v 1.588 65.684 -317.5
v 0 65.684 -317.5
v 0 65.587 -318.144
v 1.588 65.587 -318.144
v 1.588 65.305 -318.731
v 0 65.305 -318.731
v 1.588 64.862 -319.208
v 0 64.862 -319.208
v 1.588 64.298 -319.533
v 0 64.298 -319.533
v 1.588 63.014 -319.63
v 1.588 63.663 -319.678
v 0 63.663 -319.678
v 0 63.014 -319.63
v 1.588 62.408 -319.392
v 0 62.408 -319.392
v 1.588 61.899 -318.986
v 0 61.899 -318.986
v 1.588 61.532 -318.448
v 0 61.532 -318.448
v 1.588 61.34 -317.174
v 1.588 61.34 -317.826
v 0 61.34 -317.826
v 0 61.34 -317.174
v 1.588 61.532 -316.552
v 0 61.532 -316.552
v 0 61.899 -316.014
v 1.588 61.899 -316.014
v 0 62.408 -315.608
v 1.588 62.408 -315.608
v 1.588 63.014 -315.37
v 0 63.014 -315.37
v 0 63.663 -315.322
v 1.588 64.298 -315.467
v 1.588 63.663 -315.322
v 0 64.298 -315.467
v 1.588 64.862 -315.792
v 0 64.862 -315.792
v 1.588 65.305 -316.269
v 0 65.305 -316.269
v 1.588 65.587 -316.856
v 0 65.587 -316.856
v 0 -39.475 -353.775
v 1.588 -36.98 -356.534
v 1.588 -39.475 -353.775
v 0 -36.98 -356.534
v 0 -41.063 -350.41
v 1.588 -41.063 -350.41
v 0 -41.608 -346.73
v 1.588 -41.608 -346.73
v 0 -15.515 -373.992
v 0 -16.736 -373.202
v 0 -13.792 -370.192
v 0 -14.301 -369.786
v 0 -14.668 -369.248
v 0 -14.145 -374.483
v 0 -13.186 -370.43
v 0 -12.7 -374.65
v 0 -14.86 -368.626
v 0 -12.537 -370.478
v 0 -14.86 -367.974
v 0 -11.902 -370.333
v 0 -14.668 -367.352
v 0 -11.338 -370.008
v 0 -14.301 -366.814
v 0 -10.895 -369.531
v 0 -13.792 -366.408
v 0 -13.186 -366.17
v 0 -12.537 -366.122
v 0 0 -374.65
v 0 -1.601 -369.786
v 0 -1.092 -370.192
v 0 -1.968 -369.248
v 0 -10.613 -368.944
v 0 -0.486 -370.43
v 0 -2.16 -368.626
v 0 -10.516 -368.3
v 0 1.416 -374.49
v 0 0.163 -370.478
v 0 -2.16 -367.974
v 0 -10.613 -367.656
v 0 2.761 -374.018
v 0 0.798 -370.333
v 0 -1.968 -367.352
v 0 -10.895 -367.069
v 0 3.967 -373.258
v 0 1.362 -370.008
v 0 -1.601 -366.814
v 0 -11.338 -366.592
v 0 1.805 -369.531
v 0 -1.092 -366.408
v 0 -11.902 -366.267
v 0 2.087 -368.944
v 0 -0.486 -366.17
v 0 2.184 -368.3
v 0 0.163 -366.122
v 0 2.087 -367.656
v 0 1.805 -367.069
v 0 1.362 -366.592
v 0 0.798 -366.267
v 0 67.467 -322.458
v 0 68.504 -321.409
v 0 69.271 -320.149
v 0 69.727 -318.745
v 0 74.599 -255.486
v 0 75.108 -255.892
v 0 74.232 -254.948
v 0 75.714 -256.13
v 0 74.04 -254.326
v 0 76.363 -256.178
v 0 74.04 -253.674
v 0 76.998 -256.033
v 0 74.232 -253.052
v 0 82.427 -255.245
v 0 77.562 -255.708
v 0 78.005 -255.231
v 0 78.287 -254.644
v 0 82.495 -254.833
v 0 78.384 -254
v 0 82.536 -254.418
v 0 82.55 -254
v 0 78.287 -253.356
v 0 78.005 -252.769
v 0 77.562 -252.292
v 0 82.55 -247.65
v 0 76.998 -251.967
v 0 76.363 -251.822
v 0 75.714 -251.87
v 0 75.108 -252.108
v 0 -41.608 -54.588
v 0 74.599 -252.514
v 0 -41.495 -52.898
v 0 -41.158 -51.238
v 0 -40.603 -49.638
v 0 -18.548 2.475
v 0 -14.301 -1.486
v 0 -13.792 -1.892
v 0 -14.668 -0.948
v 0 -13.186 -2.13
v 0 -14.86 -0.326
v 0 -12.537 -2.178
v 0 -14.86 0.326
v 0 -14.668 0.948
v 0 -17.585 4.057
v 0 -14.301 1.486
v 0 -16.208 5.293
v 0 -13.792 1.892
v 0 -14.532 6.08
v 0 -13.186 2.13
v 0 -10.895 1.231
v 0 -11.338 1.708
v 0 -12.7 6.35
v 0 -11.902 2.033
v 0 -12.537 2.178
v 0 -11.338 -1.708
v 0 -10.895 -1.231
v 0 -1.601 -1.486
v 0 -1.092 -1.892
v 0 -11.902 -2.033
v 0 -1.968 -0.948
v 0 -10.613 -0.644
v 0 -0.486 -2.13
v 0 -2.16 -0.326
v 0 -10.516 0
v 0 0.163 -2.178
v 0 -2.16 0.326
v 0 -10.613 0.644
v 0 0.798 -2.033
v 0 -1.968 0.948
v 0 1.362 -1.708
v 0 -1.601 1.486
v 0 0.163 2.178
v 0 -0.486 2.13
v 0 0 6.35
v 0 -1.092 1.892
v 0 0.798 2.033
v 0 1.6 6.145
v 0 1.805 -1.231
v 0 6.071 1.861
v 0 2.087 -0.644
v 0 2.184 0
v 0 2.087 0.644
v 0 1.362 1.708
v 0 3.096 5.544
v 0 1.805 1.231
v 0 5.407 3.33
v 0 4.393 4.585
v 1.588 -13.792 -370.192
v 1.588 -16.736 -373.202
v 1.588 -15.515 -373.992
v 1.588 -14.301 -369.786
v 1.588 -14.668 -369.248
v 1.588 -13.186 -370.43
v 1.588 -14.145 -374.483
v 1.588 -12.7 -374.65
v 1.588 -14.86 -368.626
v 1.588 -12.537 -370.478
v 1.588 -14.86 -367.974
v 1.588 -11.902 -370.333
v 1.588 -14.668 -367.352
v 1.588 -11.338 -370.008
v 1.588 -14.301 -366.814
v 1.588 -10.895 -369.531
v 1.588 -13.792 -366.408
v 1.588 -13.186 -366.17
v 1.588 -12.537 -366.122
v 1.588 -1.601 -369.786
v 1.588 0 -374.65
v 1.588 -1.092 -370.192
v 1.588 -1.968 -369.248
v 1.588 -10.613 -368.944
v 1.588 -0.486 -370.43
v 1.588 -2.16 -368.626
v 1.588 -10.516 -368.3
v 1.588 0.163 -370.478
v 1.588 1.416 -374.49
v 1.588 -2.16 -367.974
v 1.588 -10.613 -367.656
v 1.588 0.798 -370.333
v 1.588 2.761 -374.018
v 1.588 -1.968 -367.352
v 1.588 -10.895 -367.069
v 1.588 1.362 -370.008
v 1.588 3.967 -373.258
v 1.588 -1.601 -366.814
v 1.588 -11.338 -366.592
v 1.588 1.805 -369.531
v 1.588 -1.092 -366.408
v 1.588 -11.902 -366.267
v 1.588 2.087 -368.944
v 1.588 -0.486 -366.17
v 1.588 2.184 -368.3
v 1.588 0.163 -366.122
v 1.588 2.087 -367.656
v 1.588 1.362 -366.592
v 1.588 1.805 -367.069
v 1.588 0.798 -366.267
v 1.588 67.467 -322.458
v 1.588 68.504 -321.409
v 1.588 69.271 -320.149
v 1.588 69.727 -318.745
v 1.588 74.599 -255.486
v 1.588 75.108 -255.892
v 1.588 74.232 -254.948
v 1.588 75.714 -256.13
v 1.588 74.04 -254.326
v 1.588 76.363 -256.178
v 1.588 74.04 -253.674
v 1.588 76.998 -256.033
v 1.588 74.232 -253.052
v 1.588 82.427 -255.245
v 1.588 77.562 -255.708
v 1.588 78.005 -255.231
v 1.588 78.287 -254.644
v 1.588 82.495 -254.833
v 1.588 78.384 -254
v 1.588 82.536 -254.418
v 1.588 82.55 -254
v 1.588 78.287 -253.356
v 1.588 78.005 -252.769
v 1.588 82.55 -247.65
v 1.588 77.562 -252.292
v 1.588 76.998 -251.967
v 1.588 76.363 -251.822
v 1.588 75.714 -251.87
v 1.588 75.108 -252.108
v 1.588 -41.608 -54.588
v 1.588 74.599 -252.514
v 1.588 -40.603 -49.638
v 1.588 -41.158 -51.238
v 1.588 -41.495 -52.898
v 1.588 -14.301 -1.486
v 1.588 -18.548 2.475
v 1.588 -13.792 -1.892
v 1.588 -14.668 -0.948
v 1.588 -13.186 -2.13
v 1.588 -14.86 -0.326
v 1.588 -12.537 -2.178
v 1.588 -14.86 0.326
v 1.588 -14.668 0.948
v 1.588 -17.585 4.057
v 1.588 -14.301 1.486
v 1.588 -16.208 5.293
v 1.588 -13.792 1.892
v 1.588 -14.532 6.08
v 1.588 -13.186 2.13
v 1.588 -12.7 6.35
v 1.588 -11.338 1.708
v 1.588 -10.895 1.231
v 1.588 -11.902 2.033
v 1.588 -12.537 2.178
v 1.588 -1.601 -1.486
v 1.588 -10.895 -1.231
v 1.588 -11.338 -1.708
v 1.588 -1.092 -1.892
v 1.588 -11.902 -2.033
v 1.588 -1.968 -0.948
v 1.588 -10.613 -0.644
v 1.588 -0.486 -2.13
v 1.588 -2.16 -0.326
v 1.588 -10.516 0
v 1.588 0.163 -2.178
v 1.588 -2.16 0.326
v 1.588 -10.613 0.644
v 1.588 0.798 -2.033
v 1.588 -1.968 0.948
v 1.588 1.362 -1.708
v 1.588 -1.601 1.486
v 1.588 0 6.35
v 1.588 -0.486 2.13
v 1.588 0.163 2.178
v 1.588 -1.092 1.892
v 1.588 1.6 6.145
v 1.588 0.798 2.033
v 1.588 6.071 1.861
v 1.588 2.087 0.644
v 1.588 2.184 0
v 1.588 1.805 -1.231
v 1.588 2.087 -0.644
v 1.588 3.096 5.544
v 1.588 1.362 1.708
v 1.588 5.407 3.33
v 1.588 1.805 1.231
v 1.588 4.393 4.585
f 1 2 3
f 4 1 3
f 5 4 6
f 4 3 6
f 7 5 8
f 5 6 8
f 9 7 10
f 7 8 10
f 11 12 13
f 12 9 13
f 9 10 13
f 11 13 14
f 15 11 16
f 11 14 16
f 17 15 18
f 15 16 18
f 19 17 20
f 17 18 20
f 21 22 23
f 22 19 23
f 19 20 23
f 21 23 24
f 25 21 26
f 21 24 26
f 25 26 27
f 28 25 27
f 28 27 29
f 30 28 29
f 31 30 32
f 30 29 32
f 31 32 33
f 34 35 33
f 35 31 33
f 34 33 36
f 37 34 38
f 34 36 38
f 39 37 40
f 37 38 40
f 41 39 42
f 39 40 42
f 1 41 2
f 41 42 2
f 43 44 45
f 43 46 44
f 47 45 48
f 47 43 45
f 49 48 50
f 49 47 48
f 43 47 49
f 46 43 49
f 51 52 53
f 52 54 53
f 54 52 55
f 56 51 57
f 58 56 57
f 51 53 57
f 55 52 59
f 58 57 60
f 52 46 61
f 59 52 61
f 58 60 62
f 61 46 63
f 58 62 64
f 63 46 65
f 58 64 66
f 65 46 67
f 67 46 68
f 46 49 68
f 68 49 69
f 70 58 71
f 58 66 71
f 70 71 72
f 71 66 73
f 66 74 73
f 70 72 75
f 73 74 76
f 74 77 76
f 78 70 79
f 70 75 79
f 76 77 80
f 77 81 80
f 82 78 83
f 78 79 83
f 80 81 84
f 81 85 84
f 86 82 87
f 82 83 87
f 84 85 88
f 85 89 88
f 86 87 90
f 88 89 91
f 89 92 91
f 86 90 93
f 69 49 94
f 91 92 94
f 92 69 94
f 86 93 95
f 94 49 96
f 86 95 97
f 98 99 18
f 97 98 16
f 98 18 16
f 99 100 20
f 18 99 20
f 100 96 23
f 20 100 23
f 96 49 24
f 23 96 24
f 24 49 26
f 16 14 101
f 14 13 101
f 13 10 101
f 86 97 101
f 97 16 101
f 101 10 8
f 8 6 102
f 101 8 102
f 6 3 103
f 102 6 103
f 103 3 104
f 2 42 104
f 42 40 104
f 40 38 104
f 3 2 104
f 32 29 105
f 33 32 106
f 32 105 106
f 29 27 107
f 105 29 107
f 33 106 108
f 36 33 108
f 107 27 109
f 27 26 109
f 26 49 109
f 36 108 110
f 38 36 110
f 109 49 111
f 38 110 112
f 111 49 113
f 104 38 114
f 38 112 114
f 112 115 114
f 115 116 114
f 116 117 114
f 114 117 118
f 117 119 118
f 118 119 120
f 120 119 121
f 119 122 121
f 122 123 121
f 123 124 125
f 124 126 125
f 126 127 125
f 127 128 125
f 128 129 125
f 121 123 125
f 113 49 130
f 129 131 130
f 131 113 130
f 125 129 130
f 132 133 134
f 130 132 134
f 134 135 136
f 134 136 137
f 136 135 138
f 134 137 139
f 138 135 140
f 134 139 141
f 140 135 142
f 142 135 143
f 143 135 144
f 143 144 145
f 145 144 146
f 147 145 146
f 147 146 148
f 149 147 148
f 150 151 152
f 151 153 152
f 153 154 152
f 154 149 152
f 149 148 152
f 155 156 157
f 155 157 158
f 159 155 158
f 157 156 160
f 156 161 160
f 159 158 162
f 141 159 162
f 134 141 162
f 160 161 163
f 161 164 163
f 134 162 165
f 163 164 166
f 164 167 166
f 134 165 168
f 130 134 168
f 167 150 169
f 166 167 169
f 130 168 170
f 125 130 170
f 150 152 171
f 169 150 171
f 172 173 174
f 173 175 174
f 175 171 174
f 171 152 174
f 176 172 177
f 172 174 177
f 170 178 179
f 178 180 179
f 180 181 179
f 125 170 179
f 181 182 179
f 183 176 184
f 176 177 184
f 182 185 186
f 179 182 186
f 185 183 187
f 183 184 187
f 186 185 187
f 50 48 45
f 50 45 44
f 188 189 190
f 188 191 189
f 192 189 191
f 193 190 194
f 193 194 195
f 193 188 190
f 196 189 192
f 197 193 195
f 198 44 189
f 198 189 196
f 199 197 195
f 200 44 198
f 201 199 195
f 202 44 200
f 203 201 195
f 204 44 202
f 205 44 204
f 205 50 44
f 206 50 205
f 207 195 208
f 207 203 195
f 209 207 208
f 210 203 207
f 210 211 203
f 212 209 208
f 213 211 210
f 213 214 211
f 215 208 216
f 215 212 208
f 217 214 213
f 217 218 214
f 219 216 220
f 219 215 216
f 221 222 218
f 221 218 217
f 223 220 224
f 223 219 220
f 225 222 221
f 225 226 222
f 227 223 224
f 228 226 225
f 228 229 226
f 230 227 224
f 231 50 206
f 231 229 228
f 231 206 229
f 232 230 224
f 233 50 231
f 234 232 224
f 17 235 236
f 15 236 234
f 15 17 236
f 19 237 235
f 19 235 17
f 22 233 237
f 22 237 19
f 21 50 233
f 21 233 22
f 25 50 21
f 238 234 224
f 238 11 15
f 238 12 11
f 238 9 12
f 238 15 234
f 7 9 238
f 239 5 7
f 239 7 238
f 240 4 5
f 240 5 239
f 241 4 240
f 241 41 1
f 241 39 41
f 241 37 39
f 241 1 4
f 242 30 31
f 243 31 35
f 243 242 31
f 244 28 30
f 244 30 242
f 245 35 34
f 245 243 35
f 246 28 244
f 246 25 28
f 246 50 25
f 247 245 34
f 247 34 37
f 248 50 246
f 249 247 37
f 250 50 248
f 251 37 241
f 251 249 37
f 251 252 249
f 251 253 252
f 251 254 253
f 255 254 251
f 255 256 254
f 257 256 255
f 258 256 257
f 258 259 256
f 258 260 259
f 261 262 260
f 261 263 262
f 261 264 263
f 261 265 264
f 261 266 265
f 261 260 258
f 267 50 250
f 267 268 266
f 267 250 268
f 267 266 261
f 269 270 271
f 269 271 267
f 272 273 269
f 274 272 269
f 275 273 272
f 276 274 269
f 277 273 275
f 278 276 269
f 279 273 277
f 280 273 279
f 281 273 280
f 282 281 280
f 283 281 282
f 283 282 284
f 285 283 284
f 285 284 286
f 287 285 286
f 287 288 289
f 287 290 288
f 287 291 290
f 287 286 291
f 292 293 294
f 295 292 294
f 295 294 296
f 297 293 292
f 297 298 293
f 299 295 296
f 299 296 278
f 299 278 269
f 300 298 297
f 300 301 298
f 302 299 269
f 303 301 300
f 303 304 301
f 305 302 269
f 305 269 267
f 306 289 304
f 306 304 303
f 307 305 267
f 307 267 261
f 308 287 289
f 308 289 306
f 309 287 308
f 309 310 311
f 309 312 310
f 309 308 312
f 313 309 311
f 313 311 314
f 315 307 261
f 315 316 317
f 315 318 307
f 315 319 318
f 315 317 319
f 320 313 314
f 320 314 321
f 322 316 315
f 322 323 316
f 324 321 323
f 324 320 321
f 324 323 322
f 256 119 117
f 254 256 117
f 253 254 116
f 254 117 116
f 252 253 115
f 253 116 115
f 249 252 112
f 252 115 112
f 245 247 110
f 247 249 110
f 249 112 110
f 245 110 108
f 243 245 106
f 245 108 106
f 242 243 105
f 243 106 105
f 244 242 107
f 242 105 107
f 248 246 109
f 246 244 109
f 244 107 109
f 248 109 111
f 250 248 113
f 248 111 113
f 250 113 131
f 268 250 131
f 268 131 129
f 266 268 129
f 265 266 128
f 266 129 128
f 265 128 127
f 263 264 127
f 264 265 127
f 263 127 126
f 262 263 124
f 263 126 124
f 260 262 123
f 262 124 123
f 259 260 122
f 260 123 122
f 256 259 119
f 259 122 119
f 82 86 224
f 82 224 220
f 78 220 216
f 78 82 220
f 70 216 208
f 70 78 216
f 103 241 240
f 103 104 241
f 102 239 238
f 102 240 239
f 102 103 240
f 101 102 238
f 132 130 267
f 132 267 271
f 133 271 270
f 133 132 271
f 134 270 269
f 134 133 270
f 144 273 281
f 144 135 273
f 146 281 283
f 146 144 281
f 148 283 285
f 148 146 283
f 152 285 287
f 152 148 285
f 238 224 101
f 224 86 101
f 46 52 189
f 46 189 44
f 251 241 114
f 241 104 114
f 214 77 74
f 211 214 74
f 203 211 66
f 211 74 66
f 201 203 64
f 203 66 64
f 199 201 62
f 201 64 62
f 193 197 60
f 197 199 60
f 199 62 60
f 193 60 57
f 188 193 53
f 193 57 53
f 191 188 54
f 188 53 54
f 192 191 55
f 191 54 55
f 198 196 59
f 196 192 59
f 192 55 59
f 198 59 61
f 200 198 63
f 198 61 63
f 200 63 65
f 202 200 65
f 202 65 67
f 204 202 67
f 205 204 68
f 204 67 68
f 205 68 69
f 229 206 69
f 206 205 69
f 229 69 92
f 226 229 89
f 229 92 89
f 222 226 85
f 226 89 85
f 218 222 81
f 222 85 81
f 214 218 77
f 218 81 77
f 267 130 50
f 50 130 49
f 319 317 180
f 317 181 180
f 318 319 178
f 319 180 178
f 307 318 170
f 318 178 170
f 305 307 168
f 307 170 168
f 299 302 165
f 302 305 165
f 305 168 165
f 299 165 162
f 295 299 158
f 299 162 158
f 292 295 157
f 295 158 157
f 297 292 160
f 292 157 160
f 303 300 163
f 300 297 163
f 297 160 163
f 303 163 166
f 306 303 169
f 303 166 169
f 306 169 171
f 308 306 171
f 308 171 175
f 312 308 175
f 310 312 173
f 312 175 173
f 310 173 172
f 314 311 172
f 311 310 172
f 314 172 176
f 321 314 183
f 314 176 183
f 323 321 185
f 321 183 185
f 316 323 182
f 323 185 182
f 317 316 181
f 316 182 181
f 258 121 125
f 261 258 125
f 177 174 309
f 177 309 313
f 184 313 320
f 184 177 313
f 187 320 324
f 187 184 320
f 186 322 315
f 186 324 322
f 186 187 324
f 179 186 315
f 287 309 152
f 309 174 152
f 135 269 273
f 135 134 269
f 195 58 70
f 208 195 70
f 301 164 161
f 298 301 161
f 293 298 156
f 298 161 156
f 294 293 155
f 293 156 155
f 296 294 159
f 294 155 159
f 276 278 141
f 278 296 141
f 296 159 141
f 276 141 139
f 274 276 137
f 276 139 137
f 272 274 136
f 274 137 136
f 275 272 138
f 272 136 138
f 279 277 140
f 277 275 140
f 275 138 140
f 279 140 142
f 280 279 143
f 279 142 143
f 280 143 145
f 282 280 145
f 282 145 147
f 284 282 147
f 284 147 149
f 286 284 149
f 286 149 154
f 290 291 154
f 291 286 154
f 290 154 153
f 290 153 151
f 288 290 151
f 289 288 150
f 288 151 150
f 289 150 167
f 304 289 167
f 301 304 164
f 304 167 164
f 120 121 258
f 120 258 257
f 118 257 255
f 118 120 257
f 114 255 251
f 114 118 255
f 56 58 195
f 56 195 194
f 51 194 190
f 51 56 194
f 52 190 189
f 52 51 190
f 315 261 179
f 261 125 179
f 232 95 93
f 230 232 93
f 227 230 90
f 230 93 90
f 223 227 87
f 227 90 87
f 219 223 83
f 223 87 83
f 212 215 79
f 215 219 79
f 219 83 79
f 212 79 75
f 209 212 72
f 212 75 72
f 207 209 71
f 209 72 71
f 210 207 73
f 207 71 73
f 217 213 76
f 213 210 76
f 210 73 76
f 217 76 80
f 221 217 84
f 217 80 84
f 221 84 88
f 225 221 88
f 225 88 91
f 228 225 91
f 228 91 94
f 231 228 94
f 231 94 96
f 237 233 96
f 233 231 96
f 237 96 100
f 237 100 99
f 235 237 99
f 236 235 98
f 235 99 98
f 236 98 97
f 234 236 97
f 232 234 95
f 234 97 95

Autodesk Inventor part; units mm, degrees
ref_plane "YZ Plane" through (0, 0, 0) normal (1, 0, 0) x (0, 1, 0)
ref_plane "XZ Plane" through (0, 0, 0) normal (0, 1, 0) x (-1, 0, 0)
ref_plane "XY Plane" through (0, 0, 0) normal (0, 0, 1) x (1, 0, 0)
sketch "maiin" plane through (0, 0, 0) normal (0, 0, 1) x (1, 0, 0)
  circle A0 centre (114.3234, 350.4213) radius 2.1844
  circle A1 centre (127.0234, 350.4213) radius 2.1844
  line L0 (86.4201, 300.7833) -> (108.4755, 352.8962)
  arc A2 (86.4201, 300.7833) -> (85.4157, 295.8335) centre (98.1157, 295.8335) ccw
  line L1 (209.5734, 102.7713) -> (133.0946, 352.2822)
  line L2 (209.5734, 96.4213) -> (209.5734, 102.7713)
  circle A3 centre (203.2234, 96.4213) radius 2.1844
  arc A4 (209.45, 95.176) -> (209.5734, 96.4213) centre (203.2234, 96.4213) ccw
  line L3 (196.75, 31.676) -> (209.45, 95.176)
  circle A5 centre (190.5234, 32.9213) radius 2.1844
  line L4 (85.4157, 295.8335) -> (85.4157, 3.6912)
  circle A6 centre (127.0234, -17.8787) radius 2.1844
  circle A7 centre (114.3234, -17.8787) radius 2.1844
  arc A8 (127.0234, -24.2287) -> (130.9902, -22.8372) centre (127.0234, -17.8787) ccw
  arc A9 (110.2871, -22.7809) -> (114.3234, -24.2287) centre (114.3234, -17.8787) ccw
  arc A10 (194.4902, 27.9628) -> (196.75, 31.676) centre (190.5234, 32.9213) ccw
  arc A11 (85.4157, 3.6912) -> (90.0433, -6.1132) centre (98.1157, 3.6912) ccw
  line L5 (130.9902, -22.8372) -> (194.4902, 27.9628)
  line L6 (110.2871, -22.7809) -> (90.0433, -6.1132)
  line L7 (114.3234, -24.2287) -> (127.0234, -24.2287)
  arc A12 (114.3234, 356.7713) -> (108.4755, 352.8962) centre (114.3234, 350.4213) ccw
  line L8 (127.0234, 356.7713) -> (114.3234, 356.7713)
  arc A13 (133.0946, 352.2822) -> (127.0234, 356.7713) centre (127.0234, 350.4213) ccw
  point P0 (137.6055, 139.9011)
  point P1 (110.8157, 355.7146)
  dimension "d0" = 12.7
  dimension "d1" = 12.7
  dimension "d2" = 25.4
sketch "Sketch1" plane through (0, 0, 0) normal (1, 0, 0) x (0, 1, 0)
  circle A0 centre (-12.7, 0) radius 2.1844
  circle A1 centre (0, 0) radius 2.1844
  line L0 (-40.6033, -49.6379) -> (-18.5478, 2.4749)
  arc A2 (-40.6033, -49.6379) -> (-41.6076, -54.5878) centre (-28.9076, -54.5878) ccw
  line L1 (82.55, -247.65) -> (6.0712, 1.8609)
  line L2 (82.55, -254) -> (82.55, -247.65)
  circle A3 centre (76.2, -254) radius 2.1844
  arc A4 (82.4267, -255.2453) -> (82.55, -254) centre (76.2, -254) ccw
  line L3 (69.7267, -318.7453) -> (82.4267, -255.2453)
  circle A5 centre (63.5, -317.5) radius 2.1844
  line L4 (-41.6076, -54.5878) -> (-41.6076, -346.7301)
  circle A6 centre (0, -368.3) radius 2.1844
  circle A7 centre (-12.7, -368.3) radius 2.1844
  arc A8 (0, -374.65) -> (3.9668, -373.2585) centre (0, -368.3) ccw
  arc A9 (-16.7362, -373.2022) -> (-12.7, -374.65) centre (-12.7, -368.3) ccw
  arc A10 (67.4668, -322.4585) -> (69.7267, -318.7453) centre (63.5, -317.5) ccw
  arc A11 (-41.6076, -346.7301) -> (-36.98, -356.5344) centre (-28.9076, -346.7301) ccw
  line L5 (3.9668, -373.2585) -> (67.4668, -322.4585)
  line L6 (-16.7362, -373.2022) -> (-36.98, -356.5344)
  line L7 (-12.7, -374.65) -> (0, -374.65)
  arc A12 (-12.7, 6.35) -> (-18.5478, 2.4749) centre (-12.7, 0) ccw
  line L8 (0, 6.35) -> (-12.7, 6.35)
  arc A13 (6.0712, 1.8609) -> (0, 6.35) centre (0, 0) ccw
extrude "Extrusion1" add sketch "Sketch1" along normal blind 1.5875
properties part number "skirt" material "Acetal Resin, White"
